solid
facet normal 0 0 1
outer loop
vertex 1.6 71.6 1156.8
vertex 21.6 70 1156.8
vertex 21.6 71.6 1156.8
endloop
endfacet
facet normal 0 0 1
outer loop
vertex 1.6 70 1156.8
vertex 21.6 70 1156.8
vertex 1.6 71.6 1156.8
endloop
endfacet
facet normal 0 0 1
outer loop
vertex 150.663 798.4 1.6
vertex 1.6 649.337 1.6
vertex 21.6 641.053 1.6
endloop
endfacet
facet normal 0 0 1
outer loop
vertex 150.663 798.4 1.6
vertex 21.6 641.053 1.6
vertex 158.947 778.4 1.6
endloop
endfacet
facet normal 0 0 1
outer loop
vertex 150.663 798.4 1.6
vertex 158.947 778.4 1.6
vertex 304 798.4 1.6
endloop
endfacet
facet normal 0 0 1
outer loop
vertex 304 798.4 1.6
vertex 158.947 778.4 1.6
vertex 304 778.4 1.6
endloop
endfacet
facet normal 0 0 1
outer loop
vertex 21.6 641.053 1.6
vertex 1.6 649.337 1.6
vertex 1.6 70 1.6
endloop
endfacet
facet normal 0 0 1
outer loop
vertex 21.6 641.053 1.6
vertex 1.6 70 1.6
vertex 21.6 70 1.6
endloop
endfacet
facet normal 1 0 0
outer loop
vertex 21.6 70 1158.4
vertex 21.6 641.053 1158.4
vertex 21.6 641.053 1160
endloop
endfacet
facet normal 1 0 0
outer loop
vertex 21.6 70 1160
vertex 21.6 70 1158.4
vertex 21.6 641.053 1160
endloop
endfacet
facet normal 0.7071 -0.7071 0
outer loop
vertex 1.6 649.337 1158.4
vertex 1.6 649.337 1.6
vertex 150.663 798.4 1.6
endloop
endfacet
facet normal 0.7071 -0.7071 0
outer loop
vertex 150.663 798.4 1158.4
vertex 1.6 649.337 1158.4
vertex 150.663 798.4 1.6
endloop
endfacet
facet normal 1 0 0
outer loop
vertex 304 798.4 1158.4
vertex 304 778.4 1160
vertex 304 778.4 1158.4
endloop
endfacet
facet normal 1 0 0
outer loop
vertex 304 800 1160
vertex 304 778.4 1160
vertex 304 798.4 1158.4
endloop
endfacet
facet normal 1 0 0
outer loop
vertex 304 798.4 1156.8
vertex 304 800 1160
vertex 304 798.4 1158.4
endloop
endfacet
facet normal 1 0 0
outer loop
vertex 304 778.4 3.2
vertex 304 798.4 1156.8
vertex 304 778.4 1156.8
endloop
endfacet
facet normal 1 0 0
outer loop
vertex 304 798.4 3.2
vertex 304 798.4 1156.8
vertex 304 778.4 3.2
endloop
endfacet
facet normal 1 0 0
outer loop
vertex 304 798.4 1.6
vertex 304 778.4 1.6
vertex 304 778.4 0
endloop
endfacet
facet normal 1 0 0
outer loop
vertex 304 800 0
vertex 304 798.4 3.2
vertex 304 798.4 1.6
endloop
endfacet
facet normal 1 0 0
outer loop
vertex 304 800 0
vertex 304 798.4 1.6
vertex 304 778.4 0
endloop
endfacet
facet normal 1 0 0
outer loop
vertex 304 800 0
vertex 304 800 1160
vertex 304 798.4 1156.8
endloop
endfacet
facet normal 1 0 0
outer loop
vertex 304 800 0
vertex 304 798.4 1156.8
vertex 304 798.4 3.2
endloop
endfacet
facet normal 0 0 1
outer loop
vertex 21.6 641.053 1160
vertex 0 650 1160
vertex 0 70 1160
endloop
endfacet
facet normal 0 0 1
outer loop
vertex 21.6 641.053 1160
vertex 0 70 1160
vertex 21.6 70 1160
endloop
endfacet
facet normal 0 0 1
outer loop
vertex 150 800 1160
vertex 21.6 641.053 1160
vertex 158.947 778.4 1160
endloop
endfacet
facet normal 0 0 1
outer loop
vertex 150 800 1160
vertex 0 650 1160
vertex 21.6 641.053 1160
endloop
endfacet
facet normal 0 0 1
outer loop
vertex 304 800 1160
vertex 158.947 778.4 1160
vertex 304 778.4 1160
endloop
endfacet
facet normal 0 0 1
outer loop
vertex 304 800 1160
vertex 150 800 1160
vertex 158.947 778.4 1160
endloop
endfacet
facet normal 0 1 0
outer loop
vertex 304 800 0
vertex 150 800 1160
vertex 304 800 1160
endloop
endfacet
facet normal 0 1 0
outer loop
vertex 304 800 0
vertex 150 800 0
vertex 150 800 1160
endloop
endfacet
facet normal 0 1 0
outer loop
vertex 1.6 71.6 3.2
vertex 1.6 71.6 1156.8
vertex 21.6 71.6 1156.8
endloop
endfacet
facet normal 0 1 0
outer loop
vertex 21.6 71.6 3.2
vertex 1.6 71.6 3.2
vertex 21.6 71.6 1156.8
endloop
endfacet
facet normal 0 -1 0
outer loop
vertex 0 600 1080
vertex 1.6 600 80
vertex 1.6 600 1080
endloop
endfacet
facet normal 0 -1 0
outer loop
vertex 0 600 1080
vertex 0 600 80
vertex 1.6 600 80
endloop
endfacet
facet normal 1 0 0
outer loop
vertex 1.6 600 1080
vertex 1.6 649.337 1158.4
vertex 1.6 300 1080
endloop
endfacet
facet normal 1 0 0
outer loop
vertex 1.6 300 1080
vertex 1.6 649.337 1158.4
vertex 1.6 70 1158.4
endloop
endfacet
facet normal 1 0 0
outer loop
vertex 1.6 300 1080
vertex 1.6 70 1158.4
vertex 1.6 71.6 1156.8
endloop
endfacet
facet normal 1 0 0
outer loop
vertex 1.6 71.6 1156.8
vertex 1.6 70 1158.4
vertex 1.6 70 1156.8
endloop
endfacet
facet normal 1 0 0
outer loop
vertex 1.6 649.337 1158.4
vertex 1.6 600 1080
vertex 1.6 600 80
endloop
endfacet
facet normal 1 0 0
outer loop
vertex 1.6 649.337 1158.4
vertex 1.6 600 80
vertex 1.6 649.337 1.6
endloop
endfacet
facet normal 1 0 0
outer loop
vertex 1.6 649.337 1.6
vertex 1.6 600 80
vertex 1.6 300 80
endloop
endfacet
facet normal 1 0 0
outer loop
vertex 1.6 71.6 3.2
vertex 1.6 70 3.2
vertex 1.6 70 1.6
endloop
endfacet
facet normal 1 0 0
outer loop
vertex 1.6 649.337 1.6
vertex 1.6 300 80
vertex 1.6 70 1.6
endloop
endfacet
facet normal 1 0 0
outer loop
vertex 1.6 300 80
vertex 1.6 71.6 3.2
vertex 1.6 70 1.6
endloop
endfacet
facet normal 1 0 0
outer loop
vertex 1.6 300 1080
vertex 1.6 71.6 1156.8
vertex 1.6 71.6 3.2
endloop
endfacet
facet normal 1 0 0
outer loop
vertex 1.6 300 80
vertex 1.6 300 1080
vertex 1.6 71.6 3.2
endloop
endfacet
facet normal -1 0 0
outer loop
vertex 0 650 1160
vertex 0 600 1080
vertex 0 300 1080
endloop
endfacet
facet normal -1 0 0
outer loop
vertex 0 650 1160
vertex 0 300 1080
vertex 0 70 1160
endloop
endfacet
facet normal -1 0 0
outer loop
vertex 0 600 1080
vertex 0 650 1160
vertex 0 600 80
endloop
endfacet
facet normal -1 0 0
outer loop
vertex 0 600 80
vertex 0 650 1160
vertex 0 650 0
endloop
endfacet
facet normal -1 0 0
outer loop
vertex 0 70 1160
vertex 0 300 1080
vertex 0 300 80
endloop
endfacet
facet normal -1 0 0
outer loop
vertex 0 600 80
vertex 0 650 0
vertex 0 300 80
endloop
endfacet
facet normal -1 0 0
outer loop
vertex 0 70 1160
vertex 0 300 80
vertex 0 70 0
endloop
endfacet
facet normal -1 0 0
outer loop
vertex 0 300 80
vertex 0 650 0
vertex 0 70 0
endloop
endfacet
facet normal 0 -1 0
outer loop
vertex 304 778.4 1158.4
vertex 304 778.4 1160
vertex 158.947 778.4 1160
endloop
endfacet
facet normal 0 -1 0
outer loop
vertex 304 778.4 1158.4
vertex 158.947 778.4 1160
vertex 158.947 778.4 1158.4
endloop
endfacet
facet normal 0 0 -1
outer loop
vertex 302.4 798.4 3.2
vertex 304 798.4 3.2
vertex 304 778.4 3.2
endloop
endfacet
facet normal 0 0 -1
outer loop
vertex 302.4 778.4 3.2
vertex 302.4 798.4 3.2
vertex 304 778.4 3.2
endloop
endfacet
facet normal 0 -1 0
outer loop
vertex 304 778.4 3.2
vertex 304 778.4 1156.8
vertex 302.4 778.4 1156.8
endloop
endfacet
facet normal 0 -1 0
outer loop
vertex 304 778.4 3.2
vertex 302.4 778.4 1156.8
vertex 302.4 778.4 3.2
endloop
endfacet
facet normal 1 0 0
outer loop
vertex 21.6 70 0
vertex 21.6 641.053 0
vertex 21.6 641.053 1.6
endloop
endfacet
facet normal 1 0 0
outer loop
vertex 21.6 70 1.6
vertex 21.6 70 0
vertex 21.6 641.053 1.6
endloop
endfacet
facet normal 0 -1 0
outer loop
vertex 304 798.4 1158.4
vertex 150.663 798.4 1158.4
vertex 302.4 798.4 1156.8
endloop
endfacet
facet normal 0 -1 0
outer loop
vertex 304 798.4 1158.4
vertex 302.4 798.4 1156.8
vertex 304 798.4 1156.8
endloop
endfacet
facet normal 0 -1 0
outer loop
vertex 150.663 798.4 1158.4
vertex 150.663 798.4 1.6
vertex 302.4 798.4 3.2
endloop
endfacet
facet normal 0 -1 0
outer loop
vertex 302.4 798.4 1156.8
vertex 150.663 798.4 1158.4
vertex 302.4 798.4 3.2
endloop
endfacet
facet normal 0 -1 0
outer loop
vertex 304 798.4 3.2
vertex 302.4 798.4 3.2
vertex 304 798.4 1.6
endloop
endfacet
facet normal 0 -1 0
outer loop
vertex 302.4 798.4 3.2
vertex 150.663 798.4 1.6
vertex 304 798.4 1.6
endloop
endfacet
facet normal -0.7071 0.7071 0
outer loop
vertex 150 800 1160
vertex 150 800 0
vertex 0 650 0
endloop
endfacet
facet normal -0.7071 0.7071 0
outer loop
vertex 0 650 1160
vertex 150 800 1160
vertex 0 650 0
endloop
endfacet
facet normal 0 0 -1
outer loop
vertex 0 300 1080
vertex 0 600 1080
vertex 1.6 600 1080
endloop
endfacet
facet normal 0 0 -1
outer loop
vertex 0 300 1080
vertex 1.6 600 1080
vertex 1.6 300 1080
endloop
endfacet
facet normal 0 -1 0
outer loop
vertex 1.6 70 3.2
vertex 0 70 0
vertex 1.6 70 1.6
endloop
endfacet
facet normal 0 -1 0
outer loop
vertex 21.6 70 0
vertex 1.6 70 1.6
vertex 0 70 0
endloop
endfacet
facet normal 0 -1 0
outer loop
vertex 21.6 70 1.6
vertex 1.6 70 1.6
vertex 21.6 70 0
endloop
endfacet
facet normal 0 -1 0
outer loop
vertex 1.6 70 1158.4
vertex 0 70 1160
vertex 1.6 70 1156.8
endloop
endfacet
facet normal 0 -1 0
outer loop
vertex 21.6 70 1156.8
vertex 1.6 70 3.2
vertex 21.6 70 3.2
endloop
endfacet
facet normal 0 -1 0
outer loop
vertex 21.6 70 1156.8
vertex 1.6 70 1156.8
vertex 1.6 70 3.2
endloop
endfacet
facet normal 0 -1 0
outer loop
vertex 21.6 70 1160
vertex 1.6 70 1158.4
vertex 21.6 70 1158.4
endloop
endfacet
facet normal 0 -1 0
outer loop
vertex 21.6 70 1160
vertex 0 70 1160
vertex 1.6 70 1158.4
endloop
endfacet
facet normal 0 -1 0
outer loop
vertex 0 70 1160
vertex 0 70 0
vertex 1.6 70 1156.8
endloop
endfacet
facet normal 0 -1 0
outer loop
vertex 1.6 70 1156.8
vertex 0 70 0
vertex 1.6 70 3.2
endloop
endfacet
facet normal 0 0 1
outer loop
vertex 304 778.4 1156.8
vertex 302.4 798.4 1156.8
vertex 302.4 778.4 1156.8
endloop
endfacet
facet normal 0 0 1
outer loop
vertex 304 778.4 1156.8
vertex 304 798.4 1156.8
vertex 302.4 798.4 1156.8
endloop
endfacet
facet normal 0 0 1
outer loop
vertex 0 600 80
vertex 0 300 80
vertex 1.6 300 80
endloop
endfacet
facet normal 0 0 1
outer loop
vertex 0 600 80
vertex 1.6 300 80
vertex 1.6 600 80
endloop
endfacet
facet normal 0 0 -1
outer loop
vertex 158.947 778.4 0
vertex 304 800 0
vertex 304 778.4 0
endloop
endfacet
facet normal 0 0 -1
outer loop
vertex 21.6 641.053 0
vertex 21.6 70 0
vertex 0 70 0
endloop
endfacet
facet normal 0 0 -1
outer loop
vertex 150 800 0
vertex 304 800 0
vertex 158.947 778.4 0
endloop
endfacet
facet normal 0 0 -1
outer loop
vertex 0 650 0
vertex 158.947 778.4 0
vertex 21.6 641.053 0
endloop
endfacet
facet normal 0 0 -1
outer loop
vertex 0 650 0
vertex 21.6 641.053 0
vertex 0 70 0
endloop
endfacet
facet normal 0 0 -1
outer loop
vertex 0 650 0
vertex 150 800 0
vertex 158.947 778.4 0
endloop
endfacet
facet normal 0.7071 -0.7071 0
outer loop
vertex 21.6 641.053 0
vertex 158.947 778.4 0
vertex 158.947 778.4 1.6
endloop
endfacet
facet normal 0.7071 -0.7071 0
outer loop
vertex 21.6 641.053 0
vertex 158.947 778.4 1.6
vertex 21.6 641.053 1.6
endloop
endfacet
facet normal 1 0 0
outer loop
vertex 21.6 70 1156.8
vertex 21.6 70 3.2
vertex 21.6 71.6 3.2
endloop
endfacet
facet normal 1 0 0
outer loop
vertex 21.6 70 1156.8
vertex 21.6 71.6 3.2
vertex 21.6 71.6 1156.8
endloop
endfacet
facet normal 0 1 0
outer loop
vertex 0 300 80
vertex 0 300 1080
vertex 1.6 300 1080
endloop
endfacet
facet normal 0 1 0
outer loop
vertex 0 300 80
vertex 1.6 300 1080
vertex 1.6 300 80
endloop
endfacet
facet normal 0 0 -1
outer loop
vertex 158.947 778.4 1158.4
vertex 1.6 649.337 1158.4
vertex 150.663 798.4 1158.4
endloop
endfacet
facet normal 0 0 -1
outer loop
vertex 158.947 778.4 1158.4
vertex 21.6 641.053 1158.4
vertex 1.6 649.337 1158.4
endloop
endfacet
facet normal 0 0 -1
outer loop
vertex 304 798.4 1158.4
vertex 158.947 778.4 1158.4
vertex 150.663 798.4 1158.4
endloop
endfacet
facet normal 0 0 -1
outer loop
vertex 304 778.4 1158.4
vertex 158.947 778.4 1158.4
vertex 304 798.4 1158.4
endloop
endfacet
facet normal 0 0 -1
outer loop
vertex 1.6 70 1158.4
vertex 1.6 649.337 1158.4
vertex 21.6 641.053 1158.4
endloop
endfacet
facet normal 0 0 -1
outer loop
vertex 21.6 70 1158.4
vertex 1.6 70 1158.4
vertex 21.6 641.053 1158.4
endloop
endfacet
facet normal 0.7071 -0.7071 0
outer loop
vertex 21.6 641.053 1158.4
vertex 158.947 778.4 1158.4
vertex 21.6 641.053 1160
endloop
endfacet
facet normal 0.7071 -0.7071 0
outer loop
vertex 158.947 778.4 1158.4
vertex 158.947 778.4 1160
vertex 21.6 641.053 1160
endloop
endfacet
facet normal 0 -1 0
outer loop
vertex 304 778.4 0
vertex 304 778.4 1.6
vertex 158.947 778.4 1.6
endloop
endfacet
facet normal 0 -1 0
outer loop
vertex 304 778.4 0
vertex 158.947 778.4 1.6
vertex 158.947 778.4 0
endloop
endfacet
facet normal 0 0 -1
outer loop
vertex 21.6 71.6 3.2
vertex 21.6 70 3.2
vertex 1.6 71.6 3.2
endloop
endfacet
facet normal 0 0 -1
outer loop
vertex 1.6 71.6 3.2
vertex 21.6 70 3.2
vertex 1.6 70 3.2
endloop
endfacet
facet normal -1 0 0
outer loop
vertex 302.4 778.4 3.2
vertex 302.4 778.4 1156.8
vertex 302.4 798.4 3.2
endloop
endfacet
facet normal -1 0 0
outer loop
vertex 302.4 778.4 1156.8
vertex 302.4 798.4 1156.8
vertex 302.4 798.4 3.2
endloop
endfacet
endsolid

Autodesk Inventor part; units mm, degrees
ref_plane "YZ Plane" through (0, 0, 0) normal (1, 0, 0) x (0, 1, 0)
ref_plane "XZ Plane" through (0, 0, 0) normal (0, 1, 0) x (-1, 0, 0)
ref_plane "XY Plane" through (0, 0, 0) normal (0, 0, 1) x (1, 0, 0)
sketch "Sketch1" plane through (0, 0, 0) normal (0, 0, 1) x (1, 0, 0)
  line L0 (150, 800) -> (304, 800)
  line L1 (150, 800) -> (0, 650)
  line L2 (150, 800) -> (1016.5277, 800) construction
  line L3 (0, 650) -> (0, 70)
  line L4 (1.6, 70) -> (1.6, 649.3373)
  line L5 (1.6, 649.3373) -> (150.6627, 798.4)
  line L6 (150.6627, 798.4) -> (304, 798.4)
  line L7 (304, 800) -> (304, 798.4)
  line L8 (0, 70) -> (1.6, 70)
  point P0 (0, 0)
  dimension "d0" = 154
  dimension "d1" = 800
  dimension "d2" = 135
  dimension "d8" = 150
  dimension "d9" = 580
  dimension "d10" = 70
  dimension "d19" = 1.6
extrude "Extrusion1" add sketch "Sketch1" along normal blind 1160
sketch "Sketch2" plane through (0, 70, 0) normal (-1, 0, 0) x (0, 0, 1)
  line L0 (80, 530) -> (1080, 530)
  line L1 (1080, 530) -> (1080, 230)
  line L2 (1080, 230) -> (80, 230)
  line L3 (80, 230) -> (80, 530)
  line L4 (0, 0) -> (0, 580) projected
  line L5 (0, 580) -> (1160, 580) projected
  line L6 (0, 0) -> (1160, 0) projected
  point P0 (0, -70)
  point P1 (580, 230)
  point P2 (580, 0)
  dimension "d13" = 1000
  dimension "d14" = 300
  dimension "d16" = 50
extrude "Extrusion2" cut sketch "Sketch2" against normal through all
sketch "Sketch3" plane through (0, 0, 1160) normal (0, 0, 1) x (1, 0, 0)
  line L0 (150.6627, 798.4) -> (304, 798.4) projected
  line L1 (1.6, 649.3373) -> (150.6627, 798.4) projected
  line L2 (1.6, 70) -> (1.6, 649.3373) projected
  line L3 (304, 778.4) -> (158.947, 778.4)
  line L4 (158.947, 778.4) -> (21.6, 641.053)
  line L5 (21.6, 641.053) -> (21.6, 70)
  line L6 (304, 778.4) -> (304, 798.4)
  line L7 (304, 800) -> (150, 800) projected
  line L8 (21.6, 70) -> (1.6, 70)
  point P0 (0, 0)
  dimension "d20" = 20
extrude "Extrusion3" add sketch "Sketch3" against normal blind 1.6
sketch "Sketch4" plane through (0, 0, 0) normal (0, 0, -1) x (-1, 0, 0)
  line L0 (-304, 798.4) -> (-150.6627, 798.4) projected
  line L1 (-304, 798.4) -> (-304, 778.4) projected
  line L2 (-304, 778.4) -> (-158.947, 778.4) projected
  line L3 (-158.947, 778.4) -> (-21.6, 641.053) projected
  line L4 (-21.6, 641.053) -> (-21.6, 70) projected
  line L5 (-21.6, 70) -> (-1.6, 70) projected
  line L6 (-1.6, 649.3373) -> (-1.6, 70) projected
  line L7 (-150.6627, 798.4) -> (-1.6, 649.3373) projected
  point P0 (0, 0)
extrude "Extrusion4" add sketch "Sketch4" against normal blind 1.6
sketch "Sketch5" plane through (304, 800, 1160) normal (1, 0, 0) x (0, 0, -1)
  line L0 (1158.4, -1.6) -> (1.6, -1.6) projected
  line L1 (1158.4, -21.6) -> (1158.4, -1.6) projected
  line L2 (1.6, -1.6) -> (1.6, -21.6) projected
  line L3 (1.6, -21.6) -> (1.6, -158.947) projected
  line L4 (1.6, -21.6) -> (1158.4, -21.6)
  point P0 (1160, -800)
extrude "Extrusion5" add sketch "Sketch5" against normal blind 1.6
sketch "Sketch6" plane through (0, 70, 0) normal (0, -1, 0) x (1, 0, 0)
  line L0 (1.6, 1.6) -> (21.6, 1.6) projected
  line L1 (1.6, 1.6) -> (1.6, 1158.4) projected
  line L2 (21.6, 1158.4) -> (1.6, 1158.4) projected
  line L3 (158.947, 1158.4) -> (21.6, 1158.4) projected
  line L4 (21.6, 1.6) -> (21.6, 1158.4)
  point P0 (0, 0)
extrude "Extrusion6" add sketch "Sketch6" against normal blind 1.6
sketch "Sketch7" plane through (304, 800, 1160) normal (1, 0, 0) x (0, 0, -1)
  line L0 (1.6, -1.6) -> (1.6, -21.6) projected
  line L1 (1.6, -1.6) -> (3.2, -1.6)
  line L2 (3.2, -1.6) -> (3.2, -21.6)
  line L3 (3.2, -21.6) -> (1.6, -21.6)
  line L4 (1.6, -21.6) -> (1.6, -1.6)
  line L5 (1158.4, -21.6) -> (1158.4, -1.6) projected
  line L6 (1158.4, -1.6) -> (1156.8, -1.6)
  line L7 (1156.8, -1.6) -> (1156.8, -21.6)
  line L8 (1156.8, -21.6) -> (1158.4, -21.6)
  line L9 (1158.4, -21.6) -> (1158.4, -1.6)
  point P0 (1160, -800)
  dimension "d32" = 1.6
  dimension "d33" = 20
  dimension "d34" = 1.6
  dimension "d35" = 20
extrude "Extrusion7" cut sketch "Sketch7" against normal blind 1.6
sketch "Sketch8" plane through (0, 70, 0) normal (0, -1, 0) x (1, 0, 0)
  line L0 (1.6, 1158.4) -> (1.6, 1.6) projected
  line L1 (1.6, 1.6) -> (21.6, 1.6)
  line L2 (21.6, 1.6) -> (21.6, 3.2)
  line L3 (21.6, 3.2) -> (1.6, 3.2)
  line L4 (1.6, 3.2) -> (1.6, 1.6)
  line L5 (1.6, 1158.4) -> (21.6, 1158.4)
  line L6 (21.6, 1158.4) -> (21.6, 1156.8)
  line L7 (21.6, 1156.8) -> (1.6, 1156.8)
  line L8 (1.6, 1156.8) -> (1.6, 1158.4)
  point P0 (0, 0)
  dimension "d38" = 20
  dimension "d39" = 1.6
  dimension "d40" = 20
  dimension "d41" = 1.6
extrude "Extrusion8" cut sketch "Sketch8" against normal blind 1.6
properties part number "Front Panel" material "Steel"
